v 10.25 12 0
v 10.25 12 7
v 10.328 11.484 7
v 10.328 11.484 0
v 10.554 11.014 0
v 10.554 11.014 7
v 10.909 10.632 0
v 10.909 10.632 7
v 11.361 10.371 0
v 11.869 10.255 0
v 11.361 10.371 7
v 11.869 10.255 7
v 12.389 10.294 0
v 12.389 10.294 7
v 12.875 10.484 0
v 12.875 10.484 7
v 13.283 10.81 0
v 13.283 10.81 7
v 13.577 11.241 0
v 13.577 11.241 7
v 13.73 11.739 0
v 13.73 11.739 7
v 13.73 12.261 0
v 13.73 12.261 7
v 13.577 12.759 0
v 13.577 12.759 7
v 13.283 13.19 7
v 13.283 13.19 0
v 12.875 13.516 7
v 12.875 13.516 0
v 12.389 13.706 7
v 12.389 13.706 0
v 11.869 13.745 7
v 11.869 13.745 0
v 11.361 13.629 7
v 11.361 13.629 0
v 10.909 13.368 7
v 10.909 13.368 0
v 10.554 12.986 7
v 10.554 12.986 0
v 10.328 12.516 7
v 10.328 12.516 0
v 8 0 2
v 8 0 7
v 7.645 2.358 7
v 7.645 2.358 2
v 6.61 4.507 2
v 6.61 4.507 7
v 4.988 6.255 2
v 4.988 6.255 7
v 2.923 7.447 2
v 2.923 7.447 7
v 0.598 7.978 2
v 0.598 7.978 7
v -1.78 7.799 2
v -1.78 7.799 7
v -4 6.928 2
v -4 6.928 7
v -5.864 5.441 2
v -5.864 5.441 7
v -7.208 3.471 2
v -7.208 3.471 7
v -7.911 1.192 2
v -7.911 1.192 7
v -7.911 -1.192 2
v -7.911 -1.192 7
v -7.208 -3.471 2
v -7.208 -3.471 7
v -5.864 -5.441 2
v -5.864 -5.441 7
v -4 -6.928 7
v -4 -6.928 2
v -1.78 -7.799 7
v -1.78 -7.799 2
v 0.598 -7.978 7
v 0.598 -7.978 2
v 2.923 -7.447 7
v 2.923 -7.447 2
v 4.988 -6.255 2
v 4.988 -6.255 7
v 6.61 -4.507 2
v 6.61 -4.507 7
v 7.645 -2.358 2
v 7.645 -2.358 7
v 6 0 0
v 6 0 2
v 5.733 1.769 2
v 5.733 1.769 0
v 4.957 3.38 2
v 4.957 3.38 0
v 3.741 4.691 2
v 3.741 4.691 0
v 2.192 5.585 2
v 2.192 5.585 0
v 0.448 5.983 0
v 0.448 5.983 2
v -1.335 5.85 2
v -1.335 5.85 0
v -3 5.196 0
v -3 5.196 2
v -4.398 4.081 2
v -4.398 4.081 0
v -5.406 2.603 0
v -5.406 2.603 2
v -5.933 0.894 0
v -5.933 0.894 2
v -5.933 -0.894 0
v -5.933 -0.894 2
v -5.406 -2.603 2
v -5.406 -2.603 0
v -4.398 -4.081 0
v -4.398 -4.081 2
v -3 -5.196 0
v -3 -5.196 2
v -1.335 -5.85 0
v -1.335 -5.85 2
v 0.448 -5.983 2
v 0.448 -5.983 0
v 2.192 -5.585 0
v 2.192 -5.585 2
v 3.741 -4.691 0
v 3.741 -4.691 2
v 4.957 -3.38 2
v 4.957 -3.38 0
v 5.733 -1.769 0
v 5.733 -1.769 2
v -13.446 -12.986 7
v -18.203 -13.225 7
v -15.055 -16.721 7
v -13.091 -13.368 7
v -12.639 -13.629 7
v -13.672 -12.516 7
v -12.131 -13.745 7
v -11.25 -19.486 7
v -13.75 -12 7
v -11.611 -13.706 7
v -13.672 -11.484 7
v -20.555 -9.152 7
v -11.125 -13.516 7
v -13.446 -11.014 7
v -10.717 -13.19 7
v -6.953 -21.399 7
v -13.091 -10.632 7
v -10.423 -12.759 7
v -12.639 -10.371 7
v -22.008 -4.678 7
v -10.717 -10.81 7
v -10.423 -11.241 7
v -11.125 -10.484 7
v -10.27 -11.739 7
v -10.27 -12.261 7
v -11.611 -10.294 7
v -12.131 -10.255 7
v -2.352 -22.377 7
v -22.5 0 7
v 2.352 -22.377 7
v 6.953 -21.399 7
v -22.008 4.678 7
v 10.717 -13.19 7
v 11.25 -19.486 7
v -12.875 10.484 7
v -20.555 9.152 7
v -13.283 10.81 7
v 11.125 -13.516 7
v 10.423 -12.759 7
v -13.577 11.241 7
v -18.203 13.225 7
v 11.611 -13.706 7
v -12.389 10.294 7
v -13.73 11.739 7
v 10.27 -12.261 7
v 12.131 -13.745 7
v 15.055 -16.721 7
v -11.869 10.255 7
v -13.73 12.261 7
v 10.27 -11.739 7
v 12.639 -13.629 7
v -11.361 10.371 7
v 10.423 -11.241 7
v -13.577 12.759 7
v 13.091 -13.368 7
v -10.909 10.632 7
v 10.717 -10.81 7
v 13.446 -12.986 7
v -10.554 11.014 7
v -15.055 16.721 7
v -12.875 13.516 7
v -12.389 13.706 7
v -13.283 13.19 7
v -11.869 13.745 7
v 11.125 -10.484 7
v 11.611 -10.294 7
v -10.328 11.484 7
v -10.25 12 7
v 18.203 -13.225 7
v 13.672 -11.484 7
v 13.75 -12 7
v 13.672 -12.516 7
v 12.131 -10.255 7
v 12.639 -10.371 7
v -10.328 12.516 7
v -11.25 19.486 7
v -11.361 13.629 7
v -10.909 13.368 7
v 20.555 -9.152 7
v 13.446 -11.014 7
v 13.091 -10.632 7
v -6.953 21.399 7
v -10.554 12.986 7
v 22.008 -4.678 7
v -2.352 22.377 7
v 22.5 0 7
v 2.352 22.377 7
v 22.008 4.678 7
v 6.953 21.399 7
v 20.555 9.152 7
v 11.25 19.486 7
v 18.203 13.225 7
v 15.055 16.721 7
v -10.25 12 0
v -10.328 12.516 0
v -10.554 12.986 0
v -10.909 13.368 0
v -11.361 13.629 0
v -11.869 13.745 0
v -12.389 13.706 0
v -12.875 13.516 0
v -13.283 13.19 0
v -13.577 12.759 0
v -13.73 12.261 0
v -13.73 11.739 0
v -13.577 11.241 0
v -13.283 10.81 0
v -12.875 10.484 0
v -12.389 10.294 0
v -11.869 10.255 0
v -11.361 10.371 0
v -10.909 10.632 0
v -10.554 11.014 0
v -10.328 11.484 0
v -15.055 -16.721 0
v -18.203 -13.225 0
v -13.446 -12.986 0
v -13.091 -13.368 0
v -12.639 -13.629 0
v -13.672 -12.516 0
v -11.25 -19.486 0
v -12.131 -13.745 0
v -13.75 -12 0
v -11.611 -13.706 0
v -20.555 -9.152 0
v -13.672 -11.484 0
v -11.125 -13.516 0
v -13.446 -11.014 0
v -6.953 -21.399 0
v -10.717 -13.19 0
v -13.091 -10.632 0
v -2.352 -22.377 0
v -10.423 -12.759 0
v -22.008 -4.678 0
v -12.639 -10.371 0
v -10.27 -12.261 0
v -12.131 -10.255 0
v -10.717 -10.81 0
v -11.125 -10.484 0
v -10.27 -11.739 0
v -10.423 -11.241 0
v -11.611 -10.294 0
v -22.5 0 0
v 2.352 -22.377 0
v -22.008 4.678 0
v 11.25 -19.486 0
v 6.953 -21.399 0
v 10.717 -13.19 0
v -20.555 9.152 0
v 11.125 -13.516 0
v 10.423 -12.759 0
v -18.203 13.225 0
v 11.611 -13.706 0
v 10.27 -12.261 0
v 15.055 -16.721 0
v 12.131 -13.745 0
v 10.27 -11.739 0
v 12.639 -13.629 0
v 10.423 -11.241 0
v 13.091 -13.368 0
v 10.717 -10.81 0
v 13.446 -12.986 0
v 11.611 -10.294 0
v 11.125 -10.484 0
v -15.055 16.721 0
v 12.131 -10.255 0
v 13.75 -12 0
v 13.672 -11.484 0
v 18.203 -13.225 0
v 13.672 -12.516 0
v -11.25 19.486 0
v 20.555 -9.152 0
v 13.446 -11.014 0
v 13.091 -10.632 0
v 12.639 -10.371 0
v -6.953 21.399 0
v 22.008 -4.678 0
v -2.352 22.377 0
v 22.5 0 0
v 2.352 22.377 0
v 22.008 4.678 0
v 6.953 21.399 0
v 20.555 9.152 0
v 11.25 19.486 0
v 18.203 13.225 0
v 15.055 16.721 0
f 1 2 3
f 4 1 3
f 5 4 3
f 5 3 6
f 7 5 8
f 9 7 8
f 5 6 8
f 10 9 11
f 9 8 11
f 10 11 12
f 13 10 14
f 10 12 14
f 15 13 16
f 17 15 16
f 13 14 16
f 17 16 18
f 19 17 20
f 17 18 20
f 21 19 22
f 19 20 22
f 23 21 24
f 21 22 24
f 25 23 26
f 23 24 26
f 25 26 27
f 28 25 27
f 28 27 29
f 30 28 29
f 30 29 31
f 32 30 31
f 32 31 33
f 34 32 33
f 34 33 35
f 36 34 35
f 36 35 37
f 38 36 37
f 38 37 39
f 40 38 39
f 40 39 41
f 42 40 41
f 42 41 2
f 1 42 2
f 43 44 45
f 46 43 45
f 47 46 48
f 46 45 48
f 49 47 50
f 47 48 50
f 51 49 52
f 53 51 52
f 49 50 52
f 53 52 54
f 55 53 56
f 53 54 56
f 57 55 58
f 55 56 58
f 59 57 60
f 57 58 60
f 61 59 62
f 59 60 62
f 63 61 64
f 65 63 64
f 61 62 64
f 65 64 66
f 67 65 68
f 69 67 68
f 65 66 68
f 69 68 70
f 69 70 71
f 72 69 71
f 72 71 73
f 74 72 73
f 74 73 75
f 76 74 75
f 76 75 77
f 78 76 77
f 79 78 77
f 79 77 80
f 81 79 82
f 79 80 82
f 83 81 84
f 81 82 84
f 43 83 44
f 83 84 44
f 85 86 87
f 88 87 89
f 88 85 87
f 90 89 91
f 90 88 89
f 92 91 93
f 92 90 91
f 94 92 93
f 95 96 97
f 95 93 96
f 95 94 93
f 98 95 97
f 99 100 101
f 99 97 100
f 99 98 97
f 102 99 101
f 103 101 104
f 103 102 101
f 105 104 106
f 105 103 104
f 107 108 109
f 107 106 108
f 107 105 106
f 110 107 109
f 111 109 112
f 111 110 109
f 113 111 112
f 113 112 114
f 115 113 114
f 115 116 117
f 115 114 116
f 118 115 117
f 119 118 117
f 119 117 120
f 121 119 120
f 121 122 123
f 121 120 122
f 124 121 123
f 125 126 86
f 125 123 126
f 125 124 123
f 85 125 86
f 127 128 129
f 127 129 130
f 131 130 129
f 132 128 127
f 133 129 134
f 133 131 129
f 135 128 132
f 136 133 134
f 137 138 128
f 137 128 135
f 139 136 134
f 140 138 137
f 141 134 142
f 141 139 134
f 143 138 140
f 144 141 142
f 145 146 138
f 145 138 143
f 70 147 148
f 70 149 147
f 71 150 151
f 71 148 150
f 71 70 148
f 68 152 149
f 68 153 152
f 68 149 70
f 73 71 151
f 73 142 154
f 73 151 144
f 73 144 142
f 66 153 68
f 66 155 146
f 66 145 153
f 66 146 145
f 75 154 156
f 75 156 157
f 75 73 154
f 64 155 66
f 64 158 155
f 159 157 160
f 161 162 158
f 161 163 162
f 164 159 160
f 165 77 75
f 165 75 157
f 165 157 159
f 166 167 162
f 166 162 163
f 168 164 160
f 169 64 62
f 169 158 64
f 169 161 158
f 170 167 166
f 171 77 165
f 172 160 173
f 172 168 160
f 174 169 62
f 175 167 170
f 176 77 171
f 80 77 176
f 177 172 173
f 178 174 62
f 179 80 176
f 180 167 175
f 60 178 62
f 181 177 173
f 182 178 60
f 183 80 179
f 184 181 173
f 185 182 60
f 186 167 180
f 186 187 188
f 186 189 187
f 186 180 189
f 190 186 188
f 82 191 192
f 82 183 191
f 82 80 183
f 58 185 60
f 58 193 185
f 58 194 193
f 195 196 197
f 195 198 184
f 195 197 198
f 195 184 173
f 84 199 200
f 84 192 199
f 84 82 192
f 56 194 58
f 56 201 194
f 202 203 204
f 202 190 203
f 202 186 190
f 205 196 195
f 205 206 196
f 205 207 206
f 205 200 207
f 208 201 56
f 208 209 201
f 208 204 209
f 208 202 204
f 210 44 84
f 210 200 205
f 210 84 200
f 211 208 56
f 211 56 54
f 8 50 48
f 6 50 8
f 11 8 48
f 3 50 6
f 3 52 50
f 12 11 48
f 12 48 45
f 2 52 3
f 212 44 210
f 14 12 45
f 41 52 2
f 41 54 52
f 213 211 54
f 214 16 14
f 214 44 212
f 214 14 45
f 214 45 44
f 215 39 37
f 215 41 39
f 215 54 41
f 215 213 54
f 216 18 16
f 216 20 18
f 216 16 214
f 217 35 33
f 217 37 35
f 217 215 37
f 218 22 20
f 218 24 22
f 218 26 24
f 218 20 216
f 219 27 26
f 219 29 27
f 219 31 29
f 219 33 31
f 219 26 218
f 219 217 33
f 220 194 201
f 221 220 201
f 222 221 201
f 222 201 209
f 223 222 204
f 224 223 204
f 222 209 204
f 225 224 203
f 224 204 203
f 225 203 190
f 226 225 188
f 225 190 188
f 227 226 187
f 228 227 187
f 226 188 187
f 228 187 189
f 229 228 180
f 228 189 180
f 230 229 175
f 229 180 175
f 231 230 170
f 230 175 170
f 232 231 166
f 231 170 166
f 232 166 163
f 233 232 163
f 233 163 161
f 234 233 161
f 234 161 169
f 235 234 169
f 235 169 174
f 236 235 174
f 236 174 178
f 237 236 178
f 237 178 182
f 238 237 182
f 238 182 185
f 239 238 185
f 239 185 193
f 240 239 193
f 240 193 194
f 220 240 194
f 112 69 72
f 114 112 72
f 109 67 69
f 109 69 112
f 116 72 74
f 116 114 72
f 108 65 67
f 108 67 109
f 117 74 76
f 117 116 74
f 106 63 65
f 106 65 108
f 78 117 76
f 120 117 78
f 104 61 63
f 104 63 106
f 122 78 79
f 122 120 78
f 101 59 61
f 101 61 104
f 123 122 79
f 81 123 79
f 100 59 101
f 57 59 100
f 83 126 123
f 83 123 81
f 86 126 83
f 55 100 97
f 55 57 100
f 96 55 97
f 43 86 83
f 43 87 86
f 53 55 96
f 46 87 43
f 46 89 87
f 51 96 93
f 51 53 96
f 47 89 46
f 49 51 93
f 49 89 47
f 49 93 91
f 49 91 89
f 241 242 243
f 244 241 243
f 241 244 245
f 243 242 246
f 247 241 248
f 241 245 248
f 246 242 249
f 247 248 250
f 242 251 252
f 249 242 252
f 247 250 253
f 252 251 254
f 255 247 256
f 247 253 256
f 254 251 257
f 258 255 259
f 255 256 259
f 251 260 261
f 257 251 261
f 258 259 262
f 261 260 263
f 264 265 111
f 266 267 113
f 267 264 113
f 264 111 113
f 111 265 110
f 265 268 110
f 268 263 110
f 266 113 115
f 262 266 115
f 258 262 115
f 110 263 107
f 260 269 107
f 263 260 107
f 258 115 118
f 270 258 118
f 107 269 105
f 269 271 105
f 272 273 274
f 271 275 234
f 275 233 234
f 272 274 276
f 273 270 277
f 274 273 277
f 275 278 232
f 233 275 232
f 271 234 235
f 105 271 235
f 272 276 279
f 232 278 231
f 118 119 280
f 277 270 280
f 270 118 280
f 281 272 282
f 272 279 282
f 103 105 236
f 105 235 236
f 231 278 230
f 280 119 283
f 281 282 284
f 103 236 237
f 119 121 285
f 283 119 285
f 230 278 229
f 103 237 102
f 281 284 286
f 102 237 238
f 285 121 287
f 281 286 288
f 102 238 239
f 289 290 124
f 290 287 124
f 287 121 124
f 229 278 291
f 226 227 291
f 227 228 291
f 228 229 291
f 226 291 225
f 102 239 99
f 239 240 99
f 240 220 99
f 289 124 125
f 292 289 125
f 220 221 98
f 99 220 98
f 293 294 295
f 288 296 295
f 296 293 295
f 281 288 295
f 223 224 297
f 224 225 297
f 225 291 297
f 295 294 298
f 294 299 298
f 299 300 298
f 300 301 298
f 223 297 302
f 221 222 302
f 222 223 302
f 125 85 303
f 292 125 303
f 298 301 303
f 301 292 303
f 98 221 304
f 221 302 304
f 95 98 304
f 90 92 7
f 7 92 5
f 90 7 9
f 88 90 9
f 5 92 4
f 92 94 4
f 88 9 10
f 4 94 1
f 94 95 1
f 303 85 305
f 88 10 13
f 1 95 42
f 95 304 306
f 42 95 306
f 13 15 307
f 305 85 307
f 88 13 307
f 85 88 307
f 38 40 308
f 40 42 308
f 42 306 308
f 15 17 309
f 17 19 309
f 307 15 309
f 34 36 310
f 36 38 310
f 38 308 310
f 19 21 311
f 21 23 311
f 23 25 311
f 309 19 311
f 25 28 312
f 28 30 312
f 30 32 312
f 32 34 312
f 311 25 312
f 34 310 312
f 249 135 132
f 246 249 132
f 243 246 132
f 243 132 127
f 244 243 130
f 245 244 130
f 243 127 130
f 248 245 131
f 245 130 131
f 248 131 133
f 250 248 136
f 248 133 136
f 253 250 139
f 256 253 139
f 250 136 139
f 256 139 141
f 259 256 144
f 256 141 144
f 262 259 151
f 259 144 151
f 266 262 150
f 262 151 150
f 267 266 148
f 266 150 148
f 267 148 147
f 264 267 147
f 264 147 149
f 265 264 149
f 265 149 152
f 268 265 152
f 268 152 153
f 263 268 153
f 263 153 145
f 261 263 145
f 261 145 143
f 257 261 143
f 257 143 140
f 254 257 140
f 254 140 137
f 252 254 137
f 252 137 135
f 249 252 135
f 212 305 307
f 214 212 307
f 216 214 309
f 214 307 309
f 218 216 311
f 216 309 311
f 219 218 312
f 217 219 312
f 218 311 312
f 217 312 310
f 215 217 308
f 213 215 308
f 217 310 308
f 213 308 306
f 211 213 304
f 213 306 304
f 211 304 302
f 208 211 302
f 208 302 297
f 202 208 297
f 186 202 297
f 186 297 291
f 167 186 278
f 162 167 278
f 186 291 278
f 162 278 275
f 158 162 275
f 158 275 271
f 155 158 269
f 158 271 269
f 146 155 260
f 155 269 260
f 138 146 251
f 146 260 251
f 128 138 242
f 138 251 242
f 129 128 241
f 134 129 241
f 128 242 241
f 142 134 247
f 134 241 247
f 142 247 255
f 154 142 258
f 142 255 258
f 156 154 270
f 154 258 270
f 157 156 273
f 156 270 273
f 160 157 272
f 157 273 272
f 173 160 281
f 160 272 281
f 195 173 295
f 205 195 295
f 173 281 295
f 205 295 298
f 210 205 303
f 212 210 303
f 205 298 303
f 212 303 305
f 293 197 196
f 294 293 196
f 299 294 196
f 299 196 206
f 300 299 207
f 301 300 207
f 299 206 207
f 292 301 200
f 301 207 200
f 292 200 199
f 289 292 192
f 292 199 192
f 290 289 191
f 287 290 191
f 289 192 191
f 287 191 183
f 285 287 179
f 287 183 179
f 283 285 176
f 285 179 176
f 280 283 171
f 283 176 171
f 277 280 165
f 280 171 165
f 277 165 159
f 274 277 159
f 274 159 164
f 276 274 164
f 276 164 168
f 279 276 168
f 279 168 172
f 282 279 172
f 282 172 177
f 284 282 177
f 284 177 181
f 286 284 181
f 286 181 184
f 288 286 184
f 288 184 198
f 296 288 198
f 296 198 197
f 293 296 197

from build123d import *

# Parameters (mm, degrees)
SKETCH1_R           = 22.5
SKETCH1_R_2         = 6
BOSS_EXTRUDE1_DEPTH = 7
SKETCH2_R           = 8
CUT_EXTRUDE1_DEPTH  = 5
SKETCH3_R           = 1.75
CUT_EXTRUDE2_DEPTH  = 33.580669115


with BuildPart() as part:
    # Sketch1 → Boss-Extrude1 (new body)
    with BuildSketch(Plane.XY):
        Circle(SKETCH1_R)
        Circle(SKETCH1_R_2, mode=Mode.SUBTRACT)
    extrude(amount=BOSS_EXTRUDE1_DEPTH)

    # Sketch2 → Cut-Extrude1 (cut)
    with BuildSketch(Plane.XY.offset(7)):
        Circle(SKETCH2_R)
    extrude(amount=-CUT_EXTRUDE1_DEPTH, mode=Mode.SUBTRACT)

    # Sketch3 → Cut-Extrude2 (cut, through all)
    with BuildSketch(Plane.XY.offset(7)):
        with Locations((-12, 12)):
            Circle(SKETCH3_R)
        with Locations(Location((12, 12, 0), (0, 0, 180))):
            Circle(SKETCH3_R)
        with Locations((12, -12)):
            Circle(SKETCH3_R)
        with Locations(Location((-12, -12, 0), (0, 0, 180))):
            Circle(SKETCH3_R)
    extrude(amount=-CUT_EXTRUDE2_DEPTH, mode=Mode.SUBTRACT)


solid = part.part
